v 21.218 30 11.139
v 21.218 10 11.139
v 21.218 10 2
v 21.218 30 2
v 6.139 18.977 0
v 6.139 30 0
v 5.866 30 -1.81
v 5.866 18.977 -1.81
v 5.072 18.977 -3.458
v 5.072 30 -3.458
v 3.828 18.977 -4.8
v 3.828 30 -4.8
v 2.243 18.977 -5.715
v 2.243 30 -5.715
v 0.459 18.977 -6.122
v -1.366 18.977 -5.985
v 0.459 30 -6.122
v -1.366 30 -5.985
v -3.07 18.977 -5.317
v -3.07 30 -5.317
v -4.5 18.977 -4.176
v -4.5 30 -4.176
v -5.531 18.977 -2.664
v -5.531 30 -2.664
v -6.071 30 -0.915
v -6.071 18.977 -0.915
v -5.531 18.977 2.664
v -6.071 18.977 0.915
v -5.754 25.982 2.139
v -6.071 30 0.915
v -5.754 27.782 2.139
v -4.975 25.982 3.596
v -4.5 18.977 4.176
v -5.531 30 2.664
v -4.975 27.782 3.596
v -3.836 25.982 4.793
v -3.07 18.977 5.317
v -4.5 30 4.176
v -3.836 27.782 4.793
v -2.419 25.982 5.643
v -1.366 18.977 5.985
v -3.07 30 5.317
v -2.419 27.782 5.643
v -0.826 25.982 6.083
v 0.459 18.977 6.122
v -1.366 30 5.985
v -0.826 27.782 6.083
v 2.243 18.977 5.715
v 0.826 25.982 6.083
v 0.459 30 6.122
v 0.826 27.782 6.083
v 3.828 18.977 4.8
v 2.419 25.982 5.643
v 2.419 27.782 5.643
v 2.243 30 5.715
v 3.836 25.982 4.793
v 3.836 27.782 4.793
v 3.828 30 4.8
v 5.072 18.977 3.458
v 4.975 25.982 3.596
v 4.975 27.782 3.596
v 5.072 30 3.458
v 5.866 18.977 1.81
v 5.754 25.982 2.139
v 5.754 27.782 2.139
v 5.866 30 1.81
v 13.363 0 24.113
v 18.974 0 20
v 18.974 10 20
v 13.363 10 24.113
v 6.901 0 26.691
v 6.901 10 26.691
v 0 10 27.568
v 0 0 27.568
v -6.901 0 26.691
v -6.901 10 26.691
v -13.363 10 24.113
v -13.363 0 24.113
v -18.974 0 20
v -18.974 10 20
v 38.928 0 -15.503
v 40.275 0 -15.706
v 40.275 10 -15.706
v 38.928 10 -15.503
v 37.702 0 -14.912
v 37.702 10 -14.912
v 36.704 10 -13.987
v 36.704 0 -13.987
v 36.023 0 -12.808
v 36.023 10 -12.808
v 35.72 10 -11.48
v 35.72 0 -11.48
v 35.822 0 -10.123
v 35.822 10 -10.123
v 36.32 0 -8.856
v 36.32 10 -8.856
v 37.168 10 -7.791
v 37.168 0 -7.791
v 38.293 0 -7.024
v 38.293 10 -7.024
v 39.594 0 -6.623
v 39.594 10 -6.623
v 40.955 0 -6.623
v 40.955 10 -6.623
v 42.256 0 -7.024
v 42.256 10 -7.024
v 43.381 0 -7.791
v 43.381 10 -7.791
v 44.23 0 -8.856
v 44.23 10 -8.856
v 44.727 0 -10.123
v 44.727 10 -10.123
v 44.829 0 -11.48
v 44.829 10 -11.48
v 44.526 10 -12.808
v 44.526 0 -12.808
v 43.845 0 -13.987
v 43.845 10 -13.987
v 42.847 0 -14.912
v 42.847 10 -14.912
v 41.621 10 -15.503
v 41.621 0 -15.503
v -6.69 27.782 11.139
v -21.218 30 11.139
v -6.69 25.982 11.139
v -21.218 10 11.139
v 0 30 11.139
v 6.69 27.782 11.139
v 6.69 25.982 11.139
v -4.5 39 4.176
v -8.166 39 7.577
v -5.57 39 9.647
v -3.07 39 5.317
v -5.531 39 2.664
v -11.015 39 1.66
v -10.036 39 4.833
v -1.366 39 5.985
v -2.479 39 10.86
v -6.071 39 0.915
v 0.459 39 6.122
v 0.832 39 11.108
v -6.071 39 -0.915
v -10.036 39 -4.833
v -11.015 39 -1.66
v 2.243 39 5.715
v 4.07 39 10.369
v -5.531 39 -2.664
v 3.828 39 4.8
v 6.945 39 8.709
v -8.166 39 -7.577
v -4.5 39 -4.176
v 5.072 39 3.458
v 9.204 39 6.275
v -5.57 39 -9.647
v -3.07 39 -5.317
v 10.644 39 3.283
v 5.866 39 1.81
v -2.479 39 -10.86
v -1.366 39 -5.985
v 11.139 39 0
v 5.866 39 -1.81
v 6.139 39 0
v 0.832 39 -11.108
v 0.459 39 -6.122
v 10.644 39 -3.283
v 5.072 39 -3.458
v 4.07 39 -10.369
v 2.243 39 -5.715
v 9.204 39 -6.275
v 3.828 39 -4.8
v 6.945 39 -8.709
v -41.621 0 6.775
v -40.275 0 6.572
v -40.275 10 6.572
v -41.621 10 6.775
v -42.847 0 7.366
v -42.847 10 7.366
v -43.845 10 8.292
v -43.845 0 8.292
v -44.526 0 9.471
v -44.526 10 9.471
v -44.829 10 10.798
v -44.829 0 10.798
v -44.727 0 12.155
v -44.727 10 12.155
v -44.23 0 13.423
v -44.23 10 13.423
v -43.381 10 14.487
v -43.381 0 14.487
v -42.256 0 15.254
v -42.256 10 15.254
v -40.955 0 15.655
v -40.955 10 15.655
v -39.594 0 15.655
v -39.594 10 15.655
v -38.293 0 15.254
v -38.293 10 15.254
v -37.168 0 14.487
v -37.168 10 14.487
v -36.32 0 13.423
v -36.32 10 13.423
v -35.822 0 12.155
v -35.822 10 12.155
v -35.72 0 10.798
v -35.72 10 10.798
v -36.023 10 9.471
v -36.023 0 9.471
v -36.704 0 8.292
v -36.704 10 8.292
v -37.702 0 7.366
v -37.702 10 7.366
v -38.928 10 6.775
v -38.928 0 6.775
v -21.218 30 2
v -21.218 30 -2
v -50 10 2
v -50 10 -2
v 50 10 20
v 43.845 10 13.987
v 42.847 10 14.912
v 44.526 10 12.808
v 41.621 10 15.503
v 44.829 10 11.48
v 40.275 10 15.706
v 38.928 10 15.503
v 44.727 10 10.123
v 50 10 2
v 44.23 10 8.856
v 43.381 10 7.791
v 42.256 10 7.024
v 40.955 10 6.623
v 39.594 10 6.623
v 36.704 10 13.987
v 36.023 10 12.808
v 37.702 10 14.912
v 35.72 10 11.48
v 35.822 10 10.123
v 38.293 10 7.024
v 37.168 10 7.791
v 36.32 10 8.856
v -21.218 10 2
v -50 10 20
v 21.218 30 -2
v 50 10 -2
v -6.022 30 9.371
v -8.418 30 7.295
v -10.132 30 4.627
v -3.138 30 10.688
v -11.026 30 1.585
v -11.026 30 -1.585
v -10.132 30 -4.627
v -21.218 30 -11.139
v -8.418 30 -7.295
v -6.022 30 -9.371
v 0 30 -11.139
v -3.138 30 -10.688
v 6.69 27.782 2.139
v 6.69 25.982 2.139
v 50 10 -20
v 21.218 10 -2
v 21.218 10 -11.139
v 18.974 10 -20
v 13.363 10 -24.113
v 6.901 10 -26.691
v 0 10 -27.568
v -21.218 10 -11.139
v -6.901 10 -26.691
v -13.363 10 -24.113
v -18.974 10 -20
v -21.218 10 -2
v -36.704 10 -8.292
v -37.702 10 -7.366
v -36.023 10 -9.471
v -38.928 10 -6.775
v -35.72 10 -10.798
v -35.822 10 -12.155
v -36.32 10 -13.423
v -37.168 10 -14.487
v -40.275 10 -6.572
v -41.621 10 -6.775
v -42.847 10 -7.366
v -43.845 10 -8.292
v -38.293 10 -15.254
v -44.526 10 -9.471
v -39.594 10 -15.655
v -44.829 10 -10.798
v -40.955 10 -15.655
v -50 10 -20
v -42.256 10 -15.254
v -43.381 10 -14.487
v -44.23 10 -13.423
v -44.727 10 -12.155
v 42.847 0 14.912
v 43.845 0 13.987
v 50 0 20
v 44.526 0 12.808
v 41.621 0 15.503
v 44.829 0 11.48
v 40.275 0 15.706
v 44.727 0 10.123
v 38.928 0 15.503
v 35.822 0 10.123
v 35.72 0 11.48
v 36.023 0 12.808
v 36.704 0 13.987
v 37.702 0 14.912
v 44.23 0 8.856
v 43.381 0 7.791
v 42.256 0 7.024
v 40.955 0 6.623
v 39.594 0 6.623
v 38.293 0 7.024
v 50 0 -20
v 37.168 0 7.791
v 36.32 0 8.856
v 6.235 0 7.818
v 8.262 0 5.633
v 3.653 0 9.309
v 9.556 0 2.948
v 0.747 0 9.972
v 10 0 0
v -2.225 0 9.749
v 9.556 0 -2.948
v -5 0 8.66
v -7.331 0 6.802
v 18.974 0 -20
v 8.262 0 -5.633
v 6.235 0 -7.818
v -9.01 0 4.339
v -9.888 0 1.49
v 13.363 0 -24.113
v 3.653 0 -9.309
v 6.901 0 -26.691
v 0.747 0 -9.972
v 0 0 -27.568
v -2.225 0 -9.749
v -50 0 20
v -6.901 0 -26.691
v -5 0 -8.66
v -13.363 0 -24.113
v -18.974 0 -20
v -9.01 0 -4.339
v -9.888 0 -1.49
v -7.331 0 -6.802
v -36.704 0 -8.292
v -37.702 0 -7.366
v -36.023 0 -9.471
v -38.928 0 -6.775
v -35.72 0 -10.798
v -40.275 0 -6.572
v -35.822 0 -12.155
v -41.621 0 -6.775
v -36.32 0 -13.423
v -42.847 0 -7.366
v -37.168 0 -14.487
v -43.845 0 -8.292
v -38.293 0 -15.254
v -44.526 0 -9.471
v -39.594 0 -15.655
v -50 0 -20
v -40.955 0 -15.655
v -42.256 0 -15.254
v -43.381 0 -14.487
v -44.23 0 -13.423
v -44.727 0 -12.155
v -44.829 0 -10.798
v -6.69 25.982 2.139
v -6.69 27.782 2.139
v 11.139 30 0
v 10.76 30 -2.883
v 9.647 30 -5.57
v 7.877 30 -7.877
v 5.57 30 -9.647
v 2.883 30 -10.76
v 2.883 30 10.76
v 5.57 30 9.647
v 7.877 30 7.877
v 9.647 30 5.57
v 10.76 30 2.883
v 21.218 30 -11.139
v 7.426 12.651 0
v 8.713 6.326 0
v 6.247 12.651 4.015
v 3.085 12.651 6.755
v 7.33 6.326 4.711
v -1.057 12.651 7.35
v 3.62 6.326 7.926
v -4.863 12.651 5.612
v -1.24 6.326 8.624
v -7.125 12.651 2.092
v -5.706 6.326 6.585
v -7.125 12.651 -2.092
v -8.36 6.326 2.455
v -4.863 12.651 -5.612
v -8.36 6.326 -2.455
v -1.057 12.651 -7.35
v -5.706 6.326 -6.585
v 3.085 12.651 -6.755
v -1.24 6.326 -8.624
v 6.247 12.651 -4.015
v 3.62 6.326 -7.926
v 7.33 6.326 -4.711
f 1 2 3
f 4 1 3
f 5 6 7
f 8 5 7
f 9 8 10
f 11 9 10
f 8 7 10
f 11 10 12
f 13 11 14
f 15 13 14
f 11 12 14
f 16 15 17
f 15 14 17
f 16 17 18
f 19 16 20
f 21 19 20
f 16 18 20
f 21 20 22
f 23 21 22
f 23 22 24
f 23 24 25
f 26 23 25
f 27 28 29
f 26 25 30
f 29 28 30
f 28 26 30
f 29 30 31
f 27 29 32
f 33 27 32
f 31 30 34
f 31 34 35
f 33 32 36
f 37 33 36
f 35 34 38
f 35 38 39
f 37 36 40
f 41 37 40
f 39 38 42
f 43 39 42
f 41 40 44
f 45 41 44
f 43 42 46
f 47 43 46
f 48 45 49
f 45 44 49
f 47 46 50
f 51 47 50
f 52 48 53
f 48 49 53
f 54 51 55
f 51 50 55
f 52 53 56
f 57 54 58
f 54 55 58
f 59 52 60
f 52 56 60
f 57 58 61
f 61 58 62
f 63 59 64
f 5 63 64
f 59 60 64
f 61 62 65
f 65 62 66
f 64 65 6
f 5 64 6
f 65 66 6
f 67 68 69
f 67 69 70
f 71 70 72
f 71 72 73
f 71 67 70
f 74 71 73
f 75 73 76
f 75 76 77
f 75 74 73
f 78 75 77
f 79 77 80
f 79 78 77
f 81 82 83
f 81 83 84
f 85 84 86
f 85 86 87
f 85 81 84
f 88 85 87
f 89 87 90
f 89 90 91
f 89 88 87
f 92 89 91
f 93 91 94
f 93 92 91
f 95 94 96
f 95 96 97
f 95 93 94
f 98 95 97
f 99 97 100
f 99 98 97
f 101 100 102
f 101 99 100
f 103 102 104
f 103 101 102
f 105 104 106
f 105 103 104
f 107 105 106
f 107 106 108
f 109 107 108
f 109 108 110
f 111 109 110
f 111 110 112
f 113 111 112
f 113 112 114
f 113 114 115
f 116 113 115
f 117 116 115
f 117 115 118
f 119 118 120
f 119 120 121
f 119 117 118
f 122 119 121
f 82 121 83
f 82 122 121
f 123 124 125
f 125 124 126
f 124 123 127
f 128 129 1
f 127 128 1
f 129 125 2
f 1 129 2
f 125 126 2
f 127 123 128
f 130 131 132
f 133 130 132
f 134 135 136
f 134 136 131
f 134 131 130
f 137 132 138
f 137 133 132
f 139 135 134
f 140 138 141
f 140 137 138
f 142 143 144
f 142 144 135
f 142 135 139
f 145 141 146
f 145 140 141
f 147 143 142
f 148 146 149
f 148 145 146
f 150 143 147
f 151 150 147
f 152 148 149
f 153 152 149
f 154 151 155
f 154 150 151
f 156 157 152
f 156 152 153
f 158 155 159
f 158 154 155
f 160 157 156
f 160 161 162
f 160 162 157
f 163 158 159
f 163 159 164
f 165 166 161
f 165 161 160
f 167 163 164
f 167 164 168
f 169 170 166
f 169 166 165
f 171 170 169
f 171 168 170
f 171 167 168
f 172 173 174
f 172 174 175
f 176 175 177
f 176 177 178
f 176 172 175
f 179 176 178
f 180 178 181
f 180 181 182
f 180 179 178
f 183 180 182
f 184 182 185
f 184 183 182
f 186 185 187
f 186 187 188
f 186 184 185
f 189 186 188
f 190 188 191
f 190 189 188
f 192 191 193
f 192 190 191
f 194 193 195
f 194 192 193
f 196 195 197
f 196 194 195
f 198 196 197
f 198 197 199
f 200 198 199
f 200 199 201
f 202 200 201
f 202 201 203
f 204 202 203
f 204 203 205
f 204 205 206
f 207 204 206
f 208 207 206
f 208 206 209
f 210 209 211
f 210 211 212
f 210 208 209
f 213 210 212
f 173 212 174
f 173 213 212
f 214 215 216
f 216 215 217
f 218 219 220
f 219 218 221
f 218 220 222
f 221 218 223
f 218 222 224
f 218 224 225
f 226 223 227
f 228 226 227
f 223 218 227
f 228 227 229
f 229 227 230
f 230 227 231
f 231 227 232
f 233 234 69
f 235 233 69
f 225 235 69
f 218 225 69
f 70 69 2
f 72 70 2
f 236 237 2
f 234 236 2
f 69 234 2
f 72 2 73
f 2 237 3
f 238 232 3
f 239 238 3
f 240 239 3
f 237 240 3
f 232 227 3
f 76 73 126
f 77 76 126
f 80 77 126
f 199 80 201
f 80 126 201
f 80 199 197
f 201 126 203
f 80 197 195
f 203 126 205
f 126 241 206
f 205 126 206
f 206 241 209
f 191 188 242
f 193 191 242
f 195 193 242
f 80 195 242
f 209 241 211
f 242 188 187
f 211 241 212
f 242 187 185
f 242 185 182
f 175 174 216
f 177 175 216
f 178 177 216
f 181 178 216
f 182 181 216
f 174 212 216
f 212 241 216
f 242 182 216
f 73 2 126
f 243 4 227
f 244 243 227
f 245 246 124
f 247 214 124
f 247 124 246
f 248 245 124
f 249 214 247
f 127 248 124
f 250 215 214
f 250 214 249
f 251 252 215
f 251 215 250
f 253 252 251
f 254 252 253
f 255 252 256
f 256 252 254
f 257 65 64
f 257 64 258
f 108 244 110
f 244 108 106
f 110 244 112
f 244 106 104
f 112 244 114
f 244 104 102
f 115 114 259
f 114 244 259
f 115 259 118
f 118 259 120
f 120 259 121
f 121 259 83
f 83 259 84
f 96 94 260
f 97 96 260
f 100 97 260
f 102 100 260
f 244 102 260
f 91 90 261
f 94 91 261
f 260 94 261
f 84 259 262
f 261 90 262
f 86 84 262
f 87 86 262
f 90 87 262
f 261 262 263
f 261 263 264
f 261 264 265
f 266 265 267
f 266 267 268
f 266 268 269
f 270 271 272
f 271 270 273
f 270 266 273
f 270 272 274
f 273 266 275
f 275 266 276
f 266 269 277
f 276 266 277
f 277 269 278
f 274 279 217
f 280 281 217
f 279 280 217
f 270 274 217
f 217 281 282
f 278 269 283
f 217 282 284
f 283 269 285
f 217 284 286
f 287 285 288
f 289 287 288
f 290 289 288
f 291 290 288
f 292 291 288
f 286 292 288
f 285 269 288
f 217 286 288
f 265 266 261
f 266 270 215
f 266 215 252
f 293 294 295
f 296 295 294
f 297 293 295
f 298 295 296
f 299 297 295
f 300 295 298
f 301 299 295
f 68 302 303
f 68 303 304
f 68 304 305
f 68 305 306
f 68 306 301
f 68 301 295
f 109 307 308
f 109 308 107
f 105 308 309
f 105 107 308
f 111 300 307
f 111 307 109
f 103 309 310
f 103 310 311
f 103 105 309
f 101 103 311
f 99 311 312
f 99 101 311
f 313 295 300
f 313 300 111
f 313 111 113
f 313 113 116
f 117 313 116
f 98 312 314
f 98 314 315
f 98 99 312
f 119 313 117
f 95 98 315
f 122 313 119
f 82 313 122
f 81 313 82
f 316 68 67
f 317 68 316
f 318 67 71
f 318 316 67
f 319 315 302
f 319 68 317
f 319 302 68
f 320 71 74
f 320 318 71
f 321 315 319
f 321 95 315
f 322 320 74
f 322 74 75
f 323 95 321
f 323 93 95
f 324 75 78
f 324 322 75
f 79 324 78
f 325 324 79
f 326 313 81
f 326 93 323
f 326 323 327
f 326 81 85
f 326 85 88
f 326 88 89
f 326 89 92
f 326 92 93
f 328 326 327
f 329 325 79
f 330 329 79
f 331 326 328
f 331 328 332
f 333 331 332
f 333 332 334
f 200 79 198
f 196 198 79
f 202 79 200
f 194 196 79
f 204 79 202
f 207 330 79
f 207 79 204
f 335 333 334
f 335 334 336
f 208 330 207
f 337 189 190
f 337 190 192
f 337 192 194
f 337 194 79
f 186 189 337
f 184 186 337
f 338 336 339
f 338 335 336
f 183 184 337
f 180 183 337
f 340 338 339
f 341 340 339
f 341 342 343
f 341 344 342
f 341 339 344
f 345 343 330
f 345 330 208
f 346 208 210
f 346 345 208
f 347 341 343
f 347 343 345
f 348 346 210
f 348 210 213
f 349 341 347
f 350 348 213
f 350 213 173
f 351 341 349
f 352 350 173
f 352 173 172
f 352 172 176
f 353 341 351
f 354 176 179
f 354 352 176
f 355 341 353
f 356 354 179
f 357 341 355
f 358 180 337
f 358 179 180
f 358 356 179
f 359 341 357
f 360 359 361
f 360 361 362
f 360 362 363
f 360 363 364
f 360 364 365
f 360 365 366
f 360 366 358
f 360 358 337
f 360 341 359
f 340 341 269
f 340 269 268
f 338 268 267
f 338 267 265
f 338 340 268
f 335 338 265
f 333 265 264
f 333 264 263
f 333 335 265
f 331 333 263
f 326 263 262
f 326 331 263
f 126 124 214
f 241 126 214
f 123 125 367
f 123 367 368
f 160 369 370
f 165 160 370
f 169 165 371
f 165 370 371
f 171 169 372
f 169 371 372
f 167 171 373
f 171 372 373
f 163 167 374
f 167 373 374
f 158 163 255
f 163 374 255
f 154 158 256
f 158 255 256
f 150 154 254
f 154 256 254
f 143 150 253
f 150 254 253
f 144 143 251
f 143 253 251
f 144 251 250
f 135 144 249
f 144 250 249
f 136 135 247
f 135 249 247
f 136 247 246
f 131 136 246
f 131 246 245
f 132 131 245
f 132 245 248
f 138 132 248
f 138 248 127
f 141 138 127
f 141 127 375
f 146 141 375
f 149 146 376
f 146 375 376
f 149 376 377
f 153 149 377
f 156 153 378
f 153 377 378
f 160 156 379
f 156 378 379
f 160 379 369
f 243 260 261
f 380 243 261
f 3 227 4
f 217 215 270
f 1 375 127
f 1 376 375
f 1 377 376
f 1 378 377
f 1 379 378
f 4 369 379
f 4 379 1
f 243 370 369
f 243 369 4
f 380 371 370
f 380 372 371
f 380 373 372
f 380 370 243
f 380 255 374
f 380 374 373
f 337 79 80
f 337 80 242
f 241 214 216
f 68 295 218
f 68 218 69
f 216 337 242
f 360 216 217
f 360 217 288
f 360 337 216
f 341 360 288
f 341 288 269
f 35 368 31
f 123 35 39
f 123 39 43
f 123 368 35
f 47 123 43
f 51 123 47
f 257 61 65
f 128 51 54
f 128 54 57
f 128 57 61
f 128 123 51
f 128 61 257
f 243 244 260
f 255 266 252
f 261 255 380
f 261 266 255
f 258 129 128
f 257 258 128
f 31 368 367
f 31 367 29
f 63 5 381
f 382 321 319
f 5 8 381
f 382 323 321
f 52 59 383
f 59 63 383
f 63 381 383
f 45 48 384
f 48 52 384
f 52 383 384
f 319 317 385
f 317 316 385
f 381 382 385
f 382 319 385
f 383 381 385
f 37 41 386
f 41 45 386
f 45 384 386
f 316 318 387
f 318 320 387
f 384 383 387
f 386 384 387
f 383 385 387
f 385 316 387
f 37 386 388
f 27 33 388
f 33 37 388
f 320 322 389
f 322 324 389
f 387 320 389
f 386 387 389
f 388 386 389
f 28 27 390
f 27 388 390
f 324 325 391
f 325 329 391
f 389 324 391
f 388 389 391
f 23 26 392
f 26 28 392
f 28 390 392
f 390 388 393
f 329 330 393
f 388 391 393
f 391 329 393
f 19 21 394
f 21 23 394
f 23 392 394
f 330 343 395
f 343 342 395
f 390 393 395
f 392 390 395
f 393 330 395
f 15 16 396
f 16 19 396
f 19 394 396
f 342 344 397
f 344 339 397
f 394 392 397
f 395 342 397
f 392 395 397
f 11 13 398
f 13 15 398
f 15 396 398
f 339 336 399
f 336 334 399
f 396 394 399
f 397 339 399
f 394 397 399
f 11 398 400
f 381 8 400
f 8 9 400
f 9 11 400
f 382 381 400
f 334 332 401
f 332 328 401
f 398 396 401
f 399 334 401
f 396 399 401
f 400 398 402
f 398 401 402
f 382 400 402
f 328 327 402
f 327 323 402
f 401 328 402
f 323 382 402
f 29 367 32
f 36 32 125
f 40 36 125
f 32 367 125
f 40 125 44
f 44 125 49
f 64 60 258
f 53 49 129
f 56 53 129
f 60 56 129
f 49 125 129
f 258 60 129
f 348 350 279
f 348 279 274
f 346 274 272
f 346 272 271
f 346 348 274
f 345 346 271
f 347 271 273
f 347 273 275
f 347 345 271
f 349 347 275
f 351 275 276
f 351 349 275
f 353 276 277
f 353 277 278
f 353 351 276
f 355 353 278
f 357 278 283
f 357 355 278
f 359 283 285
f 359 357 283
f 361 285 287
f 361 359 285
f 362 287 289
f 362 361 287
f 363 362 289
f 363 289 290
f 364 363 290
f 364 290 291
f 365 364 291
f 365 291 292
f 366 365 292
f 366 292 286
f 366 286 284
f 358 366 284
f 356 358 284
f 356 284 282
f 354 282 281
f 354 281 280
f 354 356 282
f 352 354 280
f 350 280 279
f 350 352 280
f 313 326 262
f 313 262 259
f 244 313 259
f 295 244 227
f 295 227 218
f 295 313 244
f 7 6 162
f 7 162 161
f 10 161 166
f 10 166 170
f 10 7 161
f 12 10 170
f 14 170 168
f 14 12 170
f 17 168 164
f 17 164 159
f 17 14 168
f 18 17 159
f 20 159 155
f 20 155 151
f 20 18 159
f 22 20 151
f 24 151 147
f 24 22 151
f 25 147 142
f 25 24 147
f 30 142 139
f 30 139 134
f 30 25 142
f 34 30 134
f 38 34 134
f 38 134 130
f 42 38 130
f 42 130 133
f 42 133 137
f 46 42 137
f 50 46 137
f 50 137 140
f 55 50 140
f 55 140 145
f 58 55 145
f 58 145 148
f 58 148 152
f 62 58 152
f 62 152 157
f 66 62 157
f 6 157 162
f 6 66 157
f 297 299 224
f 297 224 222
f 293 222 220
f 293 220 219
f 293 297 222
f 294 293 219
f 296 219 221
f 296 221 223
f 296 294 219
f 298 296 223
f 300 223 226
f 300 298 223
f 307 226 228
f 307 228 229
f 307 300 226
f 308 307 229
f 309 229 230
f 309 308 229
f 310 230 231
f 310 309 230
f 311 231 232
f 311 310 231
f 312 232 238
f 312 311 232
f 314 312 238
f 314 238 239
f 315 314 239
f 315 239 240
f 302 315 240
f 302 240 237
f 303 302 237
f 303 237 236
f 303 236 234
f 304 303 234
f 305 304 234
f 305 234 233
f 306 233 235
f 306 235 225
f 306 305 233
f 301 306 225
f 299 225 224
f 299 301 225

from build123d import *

# Parameters (mm, degrees)
SKETCH2_R           = 4.566933549
BOSS_EXTRUDE1_DEPTH = 10
SKETCH3_W           = 42.436263922
SKETCH3_H           = 22.27820436
BOSS_EXTRUDE2_DEPTH = 20
RIB2_REACH          = 66.498
SKETCH5_WALL_W      = 166.044941872
SKETCH5_WALL_H      = 4
BOSS_EXTRUDE3_DEPTH = 2
SKETCH7_R           = 11.13910218
SKETCH7_R_2         = 6.13910218
EXTRUDE_THIN1_DEPTH = 9
SKETCH9_R           = 6.13910218
CUT_EXTRUDE2_DEPTH  = 65.498231097
SKETCH12_R          = 10
CUT_EXTRUDE4_DEPTH  = 19
CUT_EXTRUDE4_DRAFT  = -11.5
SKETCH13_W          = 13.380488588
SKETCH13_H          = 1.799910433
CUT_EXTRUDE5_DEPTH  = 9


with BuildPart() as part:
    # Sketch2 → Boss-Extrude1 (new body)
    with BuildSketch(Plane(origin=(0, 0, 0), x_dir=(1, 0, 0), z_dir=(0, 1, 0))):
        with BuildLine():
            Line((-50, 20), (-18.974240817, 20))
            ThreePointArc((-18.974240817, 20), (0, 27.568493151), (18.974240817, 20))
            Line((18.974240817, 20), (50, 20))
            Line((50, 20), (50, -20))
            Line((50, -20), (18.974240817, -20))
            ThreePointArc((18.974240817, -20), (0, -27.568493151), (-18.974240817, -20))
            Line((-18.974240817, -20), (-50, -20))
            Line((-50, -20), (-50, 20))
        make_face()
        with Locations(Location((-40.274600864, 11.13910218, 0), (0, 0, 270))):
            Circle(SKETCH2_R, mode=Mode.SUBTRACT)
        with Locations(Location((-40.274600864, -11.13910218, 0), (0, 0, 90))):
            Circle(SKETCH2_R, mode=Mode.SUBTRACT)
        with Locations(Location((40.274600864, -11.13910218, 0), (0, 0, 270))):
            Circle(SKETCH2_R, mode=Mode.SUBTRACT)
        with Locations(Location((40.274600864, 11.13910218, 0), (0, 0, 90))):
            Circle(SKETCH2_R, mode=Mode.SUBTRACT)
    extrude(amount=BOSS_EXTRUDE1_DEPTH)

    # Sketch3 → Boss-Extrude2 (add)
    with BuildSketch(Plane(origin=(0, 10, 0), x_dir=(1, 0, 0), z_dir=(0, 1, 0))):
        Rectangle(SKETCH3_W, SKETCH3_H)
    extrude(amount=BOSS_EXTRUDE2_DEPTH)

    # Sketch5 wall → Rib2 (add, up to next)
    with BuildSketch(Plane(origin=(-35.60906598, 20, 0), x_dir=(-0.82120161281, -0.570638161288, 0), z_dir=(0.570638161288, -0.82120161281, 0)), mode=Mode.PRIVATE) as rib2_sk1:
        Rectangle(SKETCH5_WALL_W, SKETCH5_WALL_H)
    rib2_tool1 = extrude(rib2_sk1.sketch, amount=RIB2_REACH, mode=Mode.PRIVATE) - part.part
    add(rib2_tool1.solids().sort_by_distance((-35.60906598, 20, 0))[0])

    # Sketch6 → Boss-Extrude3 (add, symmetric)
    with BuildSketch(Plane.XY):
        Polygon((21.218131961, 30), (50, 10), (21.218131961, 10), align=None)
    extrude(amount=BOSS_EXTRUDE3_DEPTH, both=True)

    # Sketch7 → Extrude-Thin1 (add)
    with BuildSketch(Plane(origin=(0, 30, 0), x_dir=(1, 0, 0), z_dir=(0, 1, 0))):
        Circle(SKETCH7_R)
        Circle(SKETCH7_R_2, mode=Mode.SUBTRACT)
    extrude(amount=EXTRUDE_THIN1_DEPTH)

    # Sketch9 → Cut-Extrude2 (cut, through all)
    with BuildSketch(Plane(origin=(0, 30, 0), x_dir=(1, 0, 0), z_dir=(0, 1, 0))):
        Circle(SKETCH9_R)
    extrude(amount=-CUT_EXTRUDE2_DEPTH, mode=Mode.SUBTRACT)


with BuildPart() as cut_extrude4_tool:
    # Sketch12 → Cut-Extrude4 (with draft: the straight prism first)
    with BuildSketch(Plane.XZ):
        Circle(SKETCH12_R)
    extrude(amount=-CUT_EXTRUDE4_DEPTH)
    # Cut-Extrude4: the draft: its side faces are tilted about the plane it starts from
    cut_extrude4_sides = [cut_extrude4_tool.faces().sort_by_distance(p)[0] for p in [
        (-10, 9.5, 0),
    ]]
    draft(cut_extrude4_sides, Plane.XZ, CUT_EXTRUDE4_DRAFT)


with BuildPart() as part_1:
    add(part.part)

    # Cut-Extrude4: cut by cut_extrude4_tool
    add(cut_extrude4_tool.part, mode=Mode.SUBTRACT)

    # Sketch13 → Cut-Extrude5 (cut)
    with BuildSketch(Plane.XY.offset(11.13910218)):
        with Locations((0, 26.881553508)):
            Rectangle(SKETCH13_W, SKETCH13_H)
    extrude(amount=-CUT_EXTRUDE5_DEPTH, mode=Mode.SUBTRACT)


solid = part_1.part
